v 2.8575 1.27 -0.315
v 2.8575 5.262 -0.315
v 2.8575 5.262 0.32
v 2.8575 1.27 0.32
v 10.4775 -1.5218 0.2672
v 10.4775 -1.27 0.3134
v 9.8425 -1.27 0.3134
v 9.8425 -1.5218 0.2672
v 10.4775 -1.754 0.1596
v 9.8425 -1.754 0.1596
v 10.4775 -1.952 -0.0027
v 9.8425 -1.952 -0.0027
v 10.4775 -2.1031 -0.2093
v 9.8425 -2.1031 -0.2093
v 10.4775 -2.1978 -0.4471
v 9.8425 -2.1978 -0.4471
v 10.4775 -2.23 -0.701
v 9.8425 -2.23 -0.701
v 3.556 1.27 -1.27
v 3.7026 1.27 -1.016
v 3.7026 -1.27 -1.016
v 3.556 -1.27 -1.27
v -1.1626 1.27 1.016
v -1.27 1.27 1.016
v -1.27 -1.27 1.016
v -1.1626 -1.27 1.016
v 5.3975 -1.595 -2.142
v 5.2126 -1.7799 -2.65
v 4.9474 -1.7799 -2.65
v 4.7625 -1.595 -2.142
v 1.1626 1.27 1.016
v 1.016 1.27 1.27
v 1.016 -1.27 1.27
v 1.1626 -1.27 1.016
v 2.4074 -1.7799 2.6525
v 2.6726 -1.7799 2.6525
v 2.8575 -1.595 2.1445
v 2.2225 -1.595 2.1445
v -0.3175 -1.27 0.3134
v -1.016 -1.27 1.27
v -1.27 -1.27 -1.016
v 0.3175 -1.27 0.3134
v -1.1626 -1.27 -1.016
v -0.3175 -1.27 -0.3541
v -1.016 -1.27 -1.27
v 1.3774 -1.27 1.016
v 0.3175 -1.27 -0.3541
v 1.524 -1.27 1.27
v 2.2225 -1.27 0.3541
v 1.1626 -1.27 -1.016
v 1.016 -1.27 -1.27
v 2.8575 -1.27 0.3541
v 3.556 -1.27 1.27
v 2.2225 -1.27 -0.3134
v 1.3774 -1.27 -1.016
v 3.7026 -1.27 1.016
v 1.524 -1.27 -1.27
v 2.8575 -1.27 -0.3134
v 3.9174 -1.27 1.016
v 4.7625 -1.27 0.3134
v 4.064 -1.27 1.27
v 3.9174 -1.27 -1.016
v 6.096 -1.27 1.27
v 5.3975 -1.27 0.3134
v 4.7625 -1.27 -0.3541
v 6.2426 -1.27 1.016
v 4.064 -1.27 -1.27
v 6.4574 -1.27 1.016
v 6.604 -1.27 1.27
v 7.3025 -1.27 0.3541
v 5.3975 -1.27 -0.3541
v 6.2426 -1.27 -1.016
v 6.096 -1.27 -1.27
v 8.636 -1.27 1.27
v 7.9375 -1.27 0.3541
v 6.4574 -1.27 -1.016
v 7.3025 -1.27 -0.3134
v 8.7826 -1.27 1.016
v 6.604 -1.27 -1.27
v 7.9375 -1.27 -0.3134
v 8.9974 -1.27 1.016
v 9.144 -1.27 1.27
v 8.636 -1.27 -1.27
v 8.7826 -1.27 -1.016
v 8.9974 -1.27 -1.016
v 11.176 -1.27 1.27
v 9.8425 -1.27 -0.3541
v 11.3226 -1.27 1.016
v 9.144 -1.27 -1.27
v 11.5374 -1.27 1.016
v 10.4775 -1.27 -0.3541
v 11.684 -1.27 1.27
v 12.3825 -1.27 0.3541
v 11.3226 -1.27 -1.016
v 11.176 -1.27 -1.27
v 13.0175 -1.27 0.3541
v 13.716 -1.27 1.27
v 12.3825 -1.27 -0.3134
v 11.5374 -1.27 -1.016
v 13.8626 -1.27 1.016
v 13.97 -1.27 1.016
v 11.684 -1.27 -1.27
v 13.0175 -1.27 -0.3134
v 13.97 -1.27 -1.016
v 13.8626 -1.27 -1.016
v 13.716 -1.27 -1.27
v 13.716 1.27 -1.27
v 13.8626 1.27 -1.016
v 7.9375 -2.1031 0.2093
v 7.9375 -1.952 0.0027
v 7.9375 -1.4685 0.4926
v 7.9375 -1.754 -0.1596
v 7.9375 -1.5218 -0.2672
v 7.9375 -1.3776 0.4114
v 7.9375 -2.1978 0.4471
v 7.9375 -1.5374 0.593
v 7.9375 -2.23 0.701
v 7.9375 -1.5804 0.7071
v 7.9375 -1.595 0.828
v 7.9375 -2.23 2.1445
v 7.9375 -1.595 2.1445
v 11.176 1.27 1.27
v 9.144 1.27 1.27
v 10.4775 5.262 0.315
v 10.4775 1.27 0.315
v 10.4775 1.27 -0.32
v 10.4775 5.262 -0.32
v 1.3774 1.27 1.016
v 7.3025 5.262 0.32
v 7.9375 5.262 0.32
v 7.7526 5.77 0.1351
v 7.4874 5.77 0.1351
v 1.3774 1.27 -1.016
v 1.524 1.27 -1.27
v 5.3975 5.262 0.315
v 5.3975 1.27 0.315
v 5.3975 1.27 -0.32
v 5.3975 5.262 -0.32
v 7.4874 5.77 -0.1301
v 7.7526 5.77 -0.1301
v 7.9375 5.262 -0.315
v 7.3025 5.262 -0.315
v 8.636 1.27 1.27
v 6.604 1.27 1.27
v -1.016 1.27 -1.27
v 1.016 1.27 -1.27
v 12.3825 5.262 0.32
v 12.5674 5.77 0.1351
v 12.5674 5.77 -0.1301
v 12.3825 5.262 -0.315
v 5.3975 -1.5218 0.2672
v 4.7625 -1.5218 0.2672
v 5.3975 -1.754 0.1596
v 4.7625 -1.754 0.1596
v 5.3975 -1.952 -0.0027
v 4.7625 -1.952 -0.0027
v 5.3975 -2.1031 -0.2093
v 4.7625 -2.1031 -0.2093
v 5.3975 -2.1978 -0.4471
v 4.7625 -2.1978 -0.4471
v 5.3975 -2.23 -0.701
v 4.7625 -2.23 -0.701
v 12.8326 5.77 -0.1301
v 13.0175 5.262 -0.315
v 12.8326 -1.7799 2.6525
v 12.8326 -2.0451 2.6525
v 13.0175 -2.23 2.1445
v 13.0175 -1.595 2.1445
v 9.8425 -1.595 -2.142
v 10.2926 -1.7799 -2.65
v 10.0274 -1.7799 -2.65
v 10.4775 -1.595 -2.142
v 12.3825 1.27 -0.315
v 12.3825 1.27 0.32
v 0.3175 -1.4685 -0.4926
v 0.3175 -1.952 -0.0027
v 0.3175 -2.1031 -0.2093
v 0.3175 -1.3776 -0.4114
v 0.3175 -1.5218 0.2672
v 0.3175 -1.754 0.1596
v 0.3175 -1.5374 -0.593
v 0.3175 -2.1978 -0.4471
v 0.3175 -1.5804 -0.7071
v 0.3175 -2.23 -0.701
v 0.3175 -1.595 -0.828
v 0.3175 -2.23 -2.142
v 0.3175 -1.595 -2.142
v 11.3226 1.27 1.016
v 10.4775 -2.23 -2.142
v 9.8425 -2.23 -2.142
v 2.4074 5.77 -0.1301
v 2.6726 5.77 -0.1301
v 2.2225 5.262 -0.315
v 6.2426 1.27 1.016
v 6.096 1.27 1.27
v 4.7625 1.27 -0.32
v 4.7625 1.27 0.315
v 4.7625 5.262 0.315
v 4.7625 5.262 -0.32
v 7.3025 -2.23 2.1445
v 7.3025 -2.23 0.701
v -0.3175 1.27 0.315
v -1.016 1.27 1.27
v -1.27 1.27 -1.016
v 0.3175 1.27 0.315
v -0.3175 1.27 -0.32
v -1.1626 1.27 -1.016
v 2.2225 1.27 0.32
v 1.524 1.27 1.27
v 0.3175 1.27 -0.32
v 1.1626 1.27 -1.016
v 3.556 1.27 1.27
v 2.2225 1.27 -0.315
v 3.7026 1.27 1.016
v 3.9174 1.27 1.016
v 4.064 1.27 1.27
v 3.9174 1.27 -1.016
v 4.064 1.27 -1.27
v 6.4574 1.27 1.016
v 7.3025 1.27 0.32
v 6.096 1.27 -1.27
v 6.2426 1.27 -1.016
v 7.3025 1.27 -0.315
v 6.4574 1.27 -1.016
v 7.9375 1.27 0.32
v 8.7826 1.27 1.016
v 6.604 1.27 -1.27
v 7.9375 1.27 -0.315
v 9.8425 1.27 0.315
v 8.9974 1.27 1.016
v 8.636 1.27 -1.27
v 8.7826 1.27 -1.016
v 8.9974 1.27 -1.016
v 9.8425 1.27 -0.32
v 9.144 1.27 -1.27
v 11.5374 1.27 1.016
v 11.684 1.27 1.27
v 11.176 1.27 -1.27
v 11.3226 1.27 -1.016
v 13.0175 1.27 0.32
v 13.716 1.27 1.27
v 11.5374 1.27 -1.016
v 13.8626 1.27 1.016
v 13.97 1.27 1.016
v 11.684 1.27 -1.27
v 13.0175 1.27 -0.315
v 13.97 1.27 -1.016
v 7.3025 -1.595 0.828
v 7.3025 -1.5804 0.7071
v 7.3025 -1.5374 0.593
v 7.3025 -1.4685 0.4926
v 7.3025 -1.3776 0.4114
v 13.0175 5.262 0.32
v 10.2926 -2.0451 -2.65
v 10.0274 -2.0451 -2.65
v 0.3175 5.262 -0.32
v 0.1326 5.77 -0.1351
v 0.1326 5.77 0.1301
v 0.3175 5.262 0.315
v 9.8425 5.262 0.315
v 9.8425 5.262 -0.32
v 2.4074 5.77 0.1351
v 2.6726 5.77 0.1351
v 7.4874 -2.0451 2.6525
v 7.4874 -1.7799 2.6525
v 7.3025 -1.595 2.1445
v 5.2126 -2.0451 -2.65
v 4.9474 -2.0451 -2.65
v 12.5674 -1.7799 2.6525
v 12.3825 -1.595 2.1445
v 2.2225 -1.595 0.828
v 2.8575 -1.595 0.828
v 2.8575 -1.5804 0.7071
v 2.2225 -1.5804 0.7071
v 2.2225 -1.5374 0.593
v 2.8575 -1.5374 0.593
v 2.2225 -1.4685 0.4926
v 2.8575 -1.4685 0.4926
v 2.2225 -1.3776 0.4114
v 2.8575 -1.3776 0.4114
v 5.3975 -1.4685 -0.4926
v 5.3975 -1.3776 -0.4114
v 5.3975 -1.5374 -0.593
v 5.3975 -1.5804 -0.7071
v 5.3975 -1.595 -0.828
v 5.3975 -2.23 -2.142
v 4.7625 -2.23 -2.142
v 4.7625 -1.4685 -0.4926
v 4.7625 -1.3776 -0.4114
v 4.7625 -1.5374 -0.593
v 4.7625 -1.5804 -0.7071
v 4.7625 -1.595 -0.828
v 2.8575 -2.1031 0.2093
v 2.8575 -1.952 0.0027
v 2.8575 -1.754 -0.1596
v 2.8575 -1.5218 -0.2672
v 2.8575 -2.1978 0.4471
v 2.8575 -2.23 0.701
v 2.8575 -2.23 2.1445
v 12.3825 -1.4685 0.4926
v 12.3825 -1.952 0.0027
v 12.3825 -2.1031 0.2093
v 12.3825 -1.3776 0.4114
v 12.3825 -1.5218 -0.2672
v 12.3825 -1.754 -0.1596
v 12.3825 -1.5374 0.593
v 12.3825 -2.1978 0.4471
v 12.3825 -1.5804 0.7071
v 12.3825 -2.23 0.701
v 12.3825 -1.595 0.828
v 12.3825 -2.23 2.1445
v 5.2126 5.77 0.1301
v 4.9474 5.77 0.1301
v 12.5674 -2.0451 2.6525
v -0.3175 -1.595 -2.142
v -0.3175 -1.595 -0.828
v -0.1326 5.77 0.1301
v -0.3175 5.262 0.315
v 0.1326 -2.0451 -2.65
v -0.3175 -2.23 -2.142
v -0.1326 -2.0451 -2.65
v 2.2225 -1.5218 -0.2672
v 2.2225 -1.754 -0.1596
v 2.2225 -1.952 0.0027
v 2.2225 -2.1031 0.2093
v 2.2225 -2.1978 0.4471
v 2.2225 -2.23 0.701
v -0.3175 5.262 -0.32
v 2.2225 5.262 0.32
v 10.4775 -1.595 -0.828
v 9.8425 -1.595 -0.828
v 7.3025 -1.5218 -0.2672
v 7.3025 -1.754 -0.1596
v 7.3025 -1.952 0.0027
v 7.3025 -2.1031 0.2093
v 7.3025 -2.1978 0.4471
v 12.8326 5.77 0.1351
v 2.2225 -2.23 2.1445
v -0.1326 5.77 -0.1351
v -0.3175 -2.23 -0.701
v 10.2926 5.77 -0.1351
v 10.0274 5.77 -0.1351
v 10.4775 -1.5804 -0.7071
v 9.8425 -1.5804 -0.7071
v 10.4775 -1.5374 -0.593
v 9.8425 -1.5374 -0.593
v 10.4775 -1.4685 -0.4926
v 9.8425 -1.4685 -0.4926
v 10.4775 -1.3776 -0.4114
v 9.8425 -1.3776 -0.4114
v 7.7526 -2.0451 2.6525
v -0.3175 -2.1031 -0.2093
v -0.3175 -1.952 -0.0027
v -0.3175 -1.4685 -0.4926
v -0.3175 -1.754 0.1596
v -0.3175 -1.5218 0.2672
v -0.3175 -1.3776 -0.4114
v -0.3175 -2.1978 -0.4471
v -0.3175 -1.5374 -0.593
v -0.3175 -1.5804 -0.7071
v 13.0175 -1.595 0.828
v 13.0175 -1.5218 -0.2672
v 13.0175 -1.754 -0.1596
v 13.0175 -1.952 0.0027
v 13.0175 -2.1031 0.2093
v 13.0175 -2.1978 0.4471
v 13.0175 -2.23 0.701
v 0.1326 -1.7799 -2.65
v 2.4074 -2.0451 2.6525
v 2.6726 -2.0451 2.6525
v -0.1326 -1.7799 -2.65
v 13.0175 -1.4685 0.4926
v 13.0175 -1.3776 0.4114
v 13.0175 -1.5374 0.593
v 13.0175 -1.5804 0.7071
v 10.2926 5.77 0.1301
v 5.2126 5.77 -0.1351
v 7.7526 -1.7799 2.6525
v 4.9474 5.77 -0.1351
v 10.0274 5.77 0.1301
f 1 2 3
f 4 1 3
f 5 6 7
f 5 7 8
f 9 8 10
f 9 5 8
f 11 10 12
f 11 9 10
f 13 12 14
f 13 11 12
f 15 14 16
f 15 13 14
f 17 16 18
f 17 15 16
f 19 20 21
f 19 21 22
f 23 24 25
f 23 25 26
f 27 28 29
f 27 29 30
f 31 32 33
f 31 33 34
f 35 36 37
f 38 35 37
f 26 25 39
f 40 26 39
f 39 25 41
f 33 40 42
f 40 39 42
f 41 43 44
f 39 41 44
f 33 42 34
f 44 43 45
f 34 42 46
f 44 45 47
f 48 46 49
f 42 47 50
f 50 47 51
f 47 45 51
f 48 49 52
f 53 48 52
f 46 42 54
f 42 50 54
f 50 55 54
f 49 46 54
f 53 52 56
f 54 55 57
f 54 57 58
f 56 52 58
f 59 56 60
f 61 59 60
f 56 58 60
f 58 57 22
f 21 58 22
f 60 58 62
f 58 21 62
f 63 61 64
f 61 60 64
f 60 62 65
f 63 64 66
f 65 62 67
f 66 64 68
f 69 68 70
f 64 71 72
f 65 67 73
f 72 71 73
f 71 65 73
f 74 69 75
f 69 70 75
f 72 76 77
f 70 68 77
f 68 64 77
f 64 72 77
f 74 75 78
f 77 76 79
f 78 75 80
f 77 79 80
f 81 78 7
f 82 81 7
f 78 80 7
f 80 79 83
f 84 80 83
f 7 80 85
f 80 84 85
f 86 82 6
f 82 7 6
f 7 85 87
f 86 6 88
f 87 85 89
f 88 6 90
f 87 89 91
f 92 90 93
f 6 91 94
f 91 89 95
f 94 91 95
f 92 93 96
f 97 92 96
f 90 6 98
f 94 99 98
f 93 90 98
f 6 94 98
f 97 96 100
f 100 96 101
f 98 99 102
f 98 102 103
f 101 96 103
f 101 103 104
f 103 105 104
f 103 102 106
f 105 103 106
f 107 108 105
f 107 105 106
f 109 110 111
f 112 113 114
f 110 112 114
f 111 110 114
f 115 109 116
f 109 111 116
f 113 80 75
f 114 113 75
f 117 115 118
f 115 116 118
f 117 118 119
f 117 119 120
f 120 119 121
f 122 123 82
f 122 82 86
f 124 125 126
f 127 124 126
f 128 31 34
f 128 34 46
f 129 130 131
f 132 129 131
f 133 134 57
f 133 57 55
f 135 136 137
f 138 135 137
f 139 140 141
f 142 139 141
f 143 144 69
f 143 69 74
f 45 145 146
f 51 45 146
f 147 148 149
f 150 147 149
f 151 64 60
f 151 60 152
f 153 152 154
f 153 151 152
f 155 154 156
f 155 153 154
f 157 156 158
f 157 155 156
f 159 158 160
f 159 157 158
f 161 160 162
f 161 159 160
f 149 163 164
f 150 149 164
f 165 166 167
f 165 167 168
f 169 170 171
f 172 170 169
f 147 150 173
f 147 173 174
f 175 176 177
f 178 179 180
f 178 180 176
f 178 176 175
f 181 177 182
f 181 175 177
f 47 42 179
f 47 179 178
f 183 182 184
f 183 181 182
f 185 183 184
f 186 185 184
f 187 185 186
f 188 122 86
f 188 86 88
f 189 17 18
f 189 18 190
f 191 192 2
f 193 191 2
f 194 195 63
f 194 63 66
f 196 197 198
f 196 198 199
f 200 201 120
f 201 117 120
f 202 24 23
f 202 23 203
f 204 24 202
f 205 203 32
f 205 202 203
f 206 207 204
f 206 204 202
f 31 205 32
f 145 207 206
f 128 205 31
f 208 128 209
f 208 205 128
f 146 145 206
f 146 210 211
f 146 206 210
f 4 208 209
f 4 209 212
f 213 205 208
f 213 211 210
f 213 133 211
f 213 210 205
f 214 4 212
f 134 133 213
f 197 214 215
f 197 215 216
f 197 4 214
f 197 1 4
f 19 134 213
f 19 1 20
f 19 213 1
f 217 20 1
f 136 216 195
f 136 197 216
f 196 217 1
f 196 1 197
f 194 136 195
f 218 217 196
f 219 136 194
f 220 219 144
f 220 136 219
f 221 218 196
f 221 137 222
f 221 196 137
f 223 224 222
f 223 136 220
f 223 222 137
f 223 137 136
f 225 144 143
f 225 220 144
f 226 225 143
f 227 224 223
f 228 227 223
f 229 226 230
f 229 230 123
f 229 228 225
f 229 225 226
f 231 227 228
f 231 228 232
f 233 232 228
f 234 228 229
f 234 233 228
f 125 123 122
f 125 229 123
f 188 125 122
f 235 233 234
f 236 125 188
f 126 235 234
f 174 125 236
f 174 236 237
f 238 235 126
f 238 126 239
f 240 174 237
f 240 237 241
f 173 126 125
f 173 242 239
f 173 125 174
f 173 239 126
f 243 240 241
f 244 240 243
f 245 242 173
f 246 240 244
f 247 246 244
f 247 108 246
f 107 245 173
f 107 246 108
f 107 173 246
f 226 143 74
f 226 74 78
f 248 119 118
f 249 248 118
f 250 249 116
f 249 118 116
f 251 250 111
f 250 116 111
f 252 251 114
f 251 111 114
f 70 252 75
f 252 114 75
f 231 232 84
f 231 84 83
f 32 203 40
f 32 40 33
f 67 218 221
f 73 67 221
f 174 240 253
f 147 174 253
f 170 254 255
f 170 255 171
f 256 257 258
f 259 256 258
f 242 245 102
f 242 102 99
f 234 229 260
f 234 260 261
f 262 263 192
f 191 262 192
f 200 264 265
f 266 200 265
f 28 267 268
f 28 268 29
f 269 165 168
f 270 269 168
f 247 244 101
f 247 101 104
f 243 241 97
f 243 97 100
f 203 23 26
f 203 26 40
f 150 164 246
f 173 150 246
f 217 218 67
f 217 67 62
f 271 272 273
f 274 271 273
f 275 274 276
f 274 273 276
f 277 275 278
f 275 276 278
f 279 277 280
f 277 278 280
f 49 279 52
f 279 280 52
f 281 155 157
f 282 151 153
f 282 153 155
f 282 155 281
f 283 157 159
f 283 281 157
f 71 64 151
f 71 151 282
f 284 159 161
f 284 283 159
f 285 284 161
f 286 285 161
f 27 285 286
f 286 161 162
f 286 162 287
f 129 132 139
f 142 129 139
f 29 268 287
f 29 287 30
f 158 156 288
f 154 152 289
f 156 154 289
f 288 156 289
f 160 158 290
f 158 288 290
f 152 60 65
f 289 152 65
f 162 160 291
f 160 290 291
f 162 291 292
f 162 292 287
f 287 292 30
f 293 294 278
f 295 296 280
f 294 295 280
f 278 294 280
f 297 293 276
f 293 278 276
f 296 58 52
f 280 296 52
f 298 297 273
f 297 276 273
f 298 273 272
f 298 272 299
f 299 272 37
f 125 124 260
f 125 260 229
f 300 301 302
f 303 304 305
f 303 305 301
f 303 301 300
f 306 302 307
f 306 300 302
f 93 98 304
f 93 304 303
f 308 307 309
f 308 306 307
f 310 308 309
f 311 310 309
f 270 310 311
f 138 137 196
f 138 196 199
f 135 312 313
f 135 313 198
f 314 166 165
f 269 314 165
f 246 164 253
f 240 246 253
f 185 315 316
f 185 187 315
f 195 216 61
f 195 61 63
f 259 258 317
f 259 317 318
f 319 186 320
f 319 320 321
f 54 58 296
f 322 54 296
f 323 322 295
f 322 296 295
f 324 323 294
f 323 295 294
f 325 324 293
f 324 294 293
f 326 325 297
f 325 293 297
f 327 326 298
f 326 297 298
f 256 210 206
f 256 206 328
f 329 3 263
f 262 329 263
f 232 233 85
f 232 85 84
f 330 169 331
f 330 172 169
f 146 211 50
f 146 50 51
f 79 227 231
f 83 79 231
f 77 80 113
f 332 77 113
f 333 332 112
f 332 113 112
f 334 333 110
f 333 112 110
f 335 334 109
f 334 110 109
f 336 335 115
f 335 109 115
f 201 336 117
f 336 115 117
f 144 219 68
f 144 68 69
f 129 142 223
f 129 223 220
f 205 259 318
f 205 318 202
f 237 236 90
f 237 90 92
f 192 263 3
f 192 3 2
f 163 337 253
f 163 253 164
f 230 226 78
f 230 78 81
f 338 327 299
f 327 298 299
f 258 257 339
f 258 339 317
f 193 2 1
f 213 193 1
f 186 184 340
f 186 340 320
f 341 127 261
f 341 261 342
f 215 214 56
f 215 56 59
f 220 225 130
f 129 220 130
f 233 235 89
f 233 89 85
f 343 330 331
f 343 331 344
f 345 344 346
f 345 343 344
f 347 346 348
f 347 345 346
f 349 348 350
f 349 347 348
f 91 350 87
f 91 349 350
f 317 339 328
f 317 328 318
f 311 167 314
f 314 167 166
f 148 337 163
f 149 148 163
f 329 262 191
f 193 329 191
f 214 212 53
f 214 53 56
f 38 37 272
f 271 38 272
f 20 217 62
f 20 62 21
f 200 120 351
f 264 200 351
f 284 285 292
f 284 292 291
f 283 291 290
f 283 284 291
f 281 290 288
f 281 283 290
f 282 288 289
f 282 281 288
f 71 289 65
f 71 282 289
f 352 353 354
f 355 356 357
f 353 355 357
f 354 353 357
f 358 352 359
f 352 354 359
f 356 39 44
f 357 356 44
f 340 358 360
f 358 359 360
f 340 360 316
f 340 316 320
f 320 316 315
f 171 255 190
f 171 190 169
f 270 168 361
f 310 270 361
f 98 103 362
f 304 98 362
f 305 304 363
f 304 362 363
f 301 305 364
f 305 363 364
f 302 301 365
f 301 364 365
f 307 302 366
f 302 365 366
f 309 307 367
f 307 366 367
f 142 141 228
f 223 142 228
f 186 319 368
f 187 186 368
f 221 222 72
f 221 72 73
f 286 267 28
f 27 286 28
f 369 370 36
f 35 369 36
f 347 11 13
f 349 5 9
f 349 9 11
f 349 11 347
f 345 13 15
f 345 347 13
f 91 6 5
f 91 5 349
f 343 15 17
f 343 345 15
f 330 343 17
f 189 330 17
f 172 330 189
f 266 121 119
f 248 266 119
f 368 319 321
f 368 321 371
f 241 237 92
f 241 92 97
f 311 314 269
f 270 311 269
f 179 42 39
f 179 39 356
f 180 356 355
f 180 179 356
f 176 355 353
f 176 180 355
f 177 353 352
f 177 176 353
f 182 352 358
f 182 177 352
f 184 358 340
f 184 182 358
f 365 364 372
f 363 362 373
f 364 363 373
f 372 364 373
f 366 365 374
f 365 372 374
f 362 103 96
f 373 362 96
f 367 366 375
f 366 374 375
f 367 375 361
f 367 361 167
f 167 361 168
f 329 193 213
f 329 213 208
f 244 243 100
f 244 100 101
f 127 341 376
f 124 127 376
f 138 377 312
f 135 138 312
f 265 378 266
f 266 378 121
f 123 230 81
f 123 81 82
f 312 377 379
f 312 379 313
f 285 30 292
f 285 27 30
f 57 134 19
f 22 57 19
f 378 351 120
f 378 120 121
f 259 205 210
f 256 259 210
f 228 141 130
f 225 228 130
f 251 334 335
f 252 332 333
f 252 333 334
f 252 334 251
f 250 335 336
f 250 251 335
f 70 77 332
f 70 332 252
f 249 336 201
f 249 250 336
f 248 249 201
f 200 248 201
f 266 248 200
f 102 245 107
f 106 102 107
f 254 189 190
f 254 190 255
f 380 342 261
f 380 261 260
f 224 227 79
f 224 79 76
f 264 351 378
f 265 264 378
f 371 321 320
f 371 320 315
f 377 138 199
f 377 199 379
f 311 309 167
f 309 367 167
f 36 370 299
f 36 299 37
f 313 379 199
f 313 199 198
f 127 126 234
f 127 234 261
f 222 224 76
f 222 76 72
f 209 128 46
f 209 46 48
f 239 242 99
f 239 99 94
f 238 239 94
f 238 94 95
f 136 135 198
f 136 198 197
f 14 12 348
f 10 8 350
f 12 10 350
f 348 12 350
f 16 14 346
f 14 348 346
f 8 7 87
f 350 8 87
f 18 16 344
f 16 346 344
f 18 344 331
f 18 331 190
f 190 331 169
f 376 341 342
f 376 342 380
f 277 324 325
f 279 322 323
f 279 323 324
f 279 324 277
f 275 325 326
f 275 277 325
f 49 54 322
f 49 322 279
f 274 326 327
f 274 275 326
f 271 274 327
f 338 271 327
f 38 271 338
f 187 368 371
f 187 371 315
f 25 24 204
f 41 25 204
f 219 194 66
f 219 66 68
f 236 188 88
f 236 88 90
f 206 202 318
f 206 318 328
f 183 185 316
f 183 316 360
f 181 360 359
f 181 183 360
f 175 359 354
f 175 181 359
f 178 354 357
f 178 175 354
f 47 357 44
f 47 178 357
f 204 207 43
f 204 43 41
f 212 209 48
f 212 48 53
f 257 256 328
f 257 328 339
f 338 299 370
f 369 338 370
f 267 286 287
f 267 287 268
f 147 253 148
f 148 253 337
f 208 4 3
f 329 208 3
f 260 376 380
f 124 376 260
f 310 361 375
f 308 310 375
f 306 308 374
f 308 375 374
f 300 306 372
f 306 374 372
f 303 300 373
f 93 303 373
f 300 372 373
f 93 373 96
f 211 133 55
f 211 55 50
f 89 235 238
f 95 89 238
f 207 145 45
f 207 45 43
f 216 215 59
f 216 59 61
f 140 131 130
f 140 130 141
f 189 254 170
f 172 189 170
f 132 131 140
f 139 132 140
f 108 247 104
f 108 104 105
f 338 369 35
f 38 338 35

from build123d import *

# Parameters (mm, degrees)
SKETCH1_W                            = 15.24
SKETCH1_H                            = 2.54
BASE_EXTRUDE_DEPTH                   = 1.27
PIN_DEPTH                            = 0.3175
PIN_CHAMFER_SIZE2                    = 0.184896879
PIN_CHAMFER_SIZE                     = 0.508
PIN_PATTERN_COUNT                    = 3
PIN_PATTERN_PITCH                    = 5.08
PIN_CHAMFER_OF_PIN_PATTERN_SIZE2     = 0.184896879
PIN_CHAMFER_OF_PIN_PATTERN_SIZE      = 0.508
PIN_2_DEPTH                          = 0.3175
PIN_2_CHAMFER_SIZE2                  = 0.184896879
PIN_2_CHAMFER_SIZE                   = 0.508
PIN_2_PATTERN_COUNT                  = 3
PIN_2_PATTERN_PITCH                  = 5.08
PIN_2_CHAMFER_OF_PIN_2_PATTERN_SIZE2 = 0.184896879
PIN_2_CHAMFER_OF_PIN_2_PATTERN_SIZE  = 0.508
SV_CUT_DEPTH                         = 4.5
SV_CUT_PATTERN_COUNT                 = 5
SV_CUT_PATTERN_PITCH                 = 2.54
LPATTERN1_COUNT                      = 3
LPATTERN1_PITCH                      = 2.54


with BuildPart() as part:
    # Sketch1 → Base Extrude (new body, symmetric)
    with BuildSketch(Plane(origin=(0, 0, 0), x_dir=(1, 0, 0), z_dir=(0, 1, 0))):
        with Locations((6.35, 0)):
            Rectangle(SKETCH1_W, SKETCH1_H)
    extrude(amount=BASE_EXTRUDE_DEPTH, both=True)

    # Sketch8 → Pin (add, symmetric)
    with BuildSketch(Plane(origin=(0, 0, 0), x_dir=(0, 0, -1), z_dir=(1, 0, 0))):
        with BuildLine():
            Line((0.32004, -1.087), (0.32004, 5.262))
            Line((0.32004, 5.262), (0.135143121, 5.77))
            Line((0.135143121, 5.77), (-0.130063121, 5.77))
            Line((-0.130063121, 5.77), (-0.31496, 5.262))
            Line((-0.31496, 5.262), (-0.31496, -1.214))
            ThreePointArc((-0.31496, -1.214), (-0.01738049, -1.93242049), (0.70104, -2.23))
            Line((0.70104, -2.23), (2.142, -2.23))
            Line((2.142, -2.23), (2.65, -2.045103121))
            Line((2.65, -2.045103121), (2.65, -1.779896879))
            Line((2.65, -1.779896879), (2.142, -1.595))
            Line((2.142, -1.595), (0.82804, -1.595))
            ThreePointArc((0.82804, -1.595), (0.468829755, -1.446210245), (0.32004, -1.087))
        make_face()
    pin = extrude(amount=PIN_DEPTH, both=True)

    # Pin Chamfer
    pin_chamfer_edges = [part.edges().sort_by_distance(p)[0] for p in [
        (0.3175, -1.9125, -2.65),
        (-0.3175, 5.77, -0.00254),
        (-0.3175, -1.9125, -2.65),
        (0.3175, 5.77, -0.00254),
    ]]
    chamfer(pin_chamfer_edges, length=PIN_CHAMFER_SIZE, length2=PIN_CHAMFER_SIZE2)

    # Pin Pattern: Pin ×3
    with Locations(*[(i * PIN_PATTERN_PITCH, 0, 0) for i in range(1, PIN_PATTERN_COUNT)]):
        add(pin)

    # Pin Chamfer of Pin Pattern
    pin_chamfer_of_pin_pattern_edges = [part.edges().sort_by_distance(p)[0] for p in [
        (5.3975, -1.9125, -2.65),
        (4.7625, 5.77, -0.00254),
        (4.7625, -1.9125, -2.65),
        (5.3975, 5.77, -0.00254),
        (10.4775, -1.9125, -2.65),
        (9.8425, 5.77, -0.00254),
        (9.8425, -1.9125, -2.65),
        (10.4775, 5.77, -0.00254),
    ]]
    chamfer(pin_chamfer_of_pin_pattern_edges, length=PIN_CHAMFER_OF_PIN_PATTERN_SIZE, length2=PIN_CHAMFER_OF_PIN_PATTERN_SIZE2)

    # Sketch9 → Pin 2 (add, symmetric)
    with BuildSketch(Plane(origin=(2.54, 0, 0), x_dir=(0, 0, -1), z_dir=(1, 0, 0))):
        with BuildLine():
            Line((-0.32004, -1.087), (-0.32004, 5.262))
            Line((-0.32004, 5.262), (-0.135143121, 5.77))
            Line((-0.135143121, 5.77), (0.130063121, 5.77))
            Line((0.130063121, 5.77), (0.31496, 5.262))
            Line((0.31496, 5.262), (0.31496, -1.214))
            ThreePointArc((0.31496, -1.214), (0.01738049, -1.93242049), (-0.70104, -2.23))
            Line((-0.70104, -2.23), (-2.14454, -2.23))
            Line((-2.14454, -2.23), (-2.65254, -2.045103121))
            Line((-2.65254, -2.045103121), (-2.65254, -1.779896879))
            Line((-2.65254, -1.779896879), (-2.14454, -1.595))
            Line((-2.14454, -1.595), (-0.82804, -1.595))
            ThreePointArc((-0.82804, -1.595), (-0.468829755, -1.446210245), (-0.32004, -1.087))
        make_face()
    pin_2 = extrude(amount=PIN_2_DEPTH, both=True)

    # Pin 2 Chamfer
    pin_2_chamfer_edges = [part.edges().sort_by_distance(p)[0] for p in [
        (2.8575, -1.9125, 2.65254),
        (2.2225, -1.9125, 2.65254),
        (2.2225, 5.77, 0.00254),
        (2.8575, 5.77, 0.00254),
    ]]
    chamfer(pin_2_chamfer_edges, length=PIN_2_CHAMFER_SIZE, length2=PIN_2_CHAMFER_SIZE2)

    # Pin 2 Pattern: Pin 2 ×3
    with Locations(*[(i * PIN_2_PATTERN_PITCH, 0, 0) for i in range(1, PIN_2_PATTERN_COUNT)]):
        add(pin_2)

    # Pin 2 Chamfer of Pin 2 Pattern
    pin_2_chamfer_of_pin_2_pattern_edges = [part.edges().sort_by_distance(p)[0] for p in [
        (7.9375, -1.9125, 2.65254),
        (7.3025, -1.9125, 2.65254),
        (7.3025, 5.77, 0.00254),
        (7.9375, 5.77, 0.00254),
        (13.0175, -1.9125, 2.65254),
        (12.3825, -1.9125, 2.65254),
        (12.3825, 5.77, 0.00254),
        (13.0175, 5.77, 0.00254),
    ]]
    chamfer(pin_2_chamfer_of_pin_2_pattern_edges, length=PIN_2_CHAMFER_OF_PIN_2_PATTERN_SIZE, length2=PIN_2_CHAMFER_OF_PIN_2_PATTERN_SIZE2)

    # Sketch15 → SV Cut (cut, through all)
    with BuildSketch(Plane(origin=(0, 1.27, 0), x_dir=(-1, 0, 0), z_dir=(0, 1, 0))):
        Polygon((-3.556, 1.27), (-3.702646976, 1.016), (-3.917353024, 1.016), (-4.064, 1.27), align=None)
        Polygon((-4.064, -1.27), (-3.917353024, -1.016), (-3.702646976, -1.016), (-3.556, -1.27), align=None)
    sv_cut = extrude(amount=-SV_CUT_DEPTH, mode=Mode.SUBTRACT)

    # SV Cut Pattern: SV Cut ×5
    with Locations(*[(i * SV_CUT_PATTERN_PITCH, 0, 0) for i in range(1, SV_CUT_PATTERN_COUNT)]):
        add(sv_cut, mode=Mode.SUBTRACT)

    # LPattern1: SV Cut ×3
    with Locations(*[(-i * LPATTERN1_PITCH, 0, 0) for i in range(1, LPATTERN1_COUNT)]):
        add(sv_cut, mode=Mode.SUBTRACT)


solid = part.part
